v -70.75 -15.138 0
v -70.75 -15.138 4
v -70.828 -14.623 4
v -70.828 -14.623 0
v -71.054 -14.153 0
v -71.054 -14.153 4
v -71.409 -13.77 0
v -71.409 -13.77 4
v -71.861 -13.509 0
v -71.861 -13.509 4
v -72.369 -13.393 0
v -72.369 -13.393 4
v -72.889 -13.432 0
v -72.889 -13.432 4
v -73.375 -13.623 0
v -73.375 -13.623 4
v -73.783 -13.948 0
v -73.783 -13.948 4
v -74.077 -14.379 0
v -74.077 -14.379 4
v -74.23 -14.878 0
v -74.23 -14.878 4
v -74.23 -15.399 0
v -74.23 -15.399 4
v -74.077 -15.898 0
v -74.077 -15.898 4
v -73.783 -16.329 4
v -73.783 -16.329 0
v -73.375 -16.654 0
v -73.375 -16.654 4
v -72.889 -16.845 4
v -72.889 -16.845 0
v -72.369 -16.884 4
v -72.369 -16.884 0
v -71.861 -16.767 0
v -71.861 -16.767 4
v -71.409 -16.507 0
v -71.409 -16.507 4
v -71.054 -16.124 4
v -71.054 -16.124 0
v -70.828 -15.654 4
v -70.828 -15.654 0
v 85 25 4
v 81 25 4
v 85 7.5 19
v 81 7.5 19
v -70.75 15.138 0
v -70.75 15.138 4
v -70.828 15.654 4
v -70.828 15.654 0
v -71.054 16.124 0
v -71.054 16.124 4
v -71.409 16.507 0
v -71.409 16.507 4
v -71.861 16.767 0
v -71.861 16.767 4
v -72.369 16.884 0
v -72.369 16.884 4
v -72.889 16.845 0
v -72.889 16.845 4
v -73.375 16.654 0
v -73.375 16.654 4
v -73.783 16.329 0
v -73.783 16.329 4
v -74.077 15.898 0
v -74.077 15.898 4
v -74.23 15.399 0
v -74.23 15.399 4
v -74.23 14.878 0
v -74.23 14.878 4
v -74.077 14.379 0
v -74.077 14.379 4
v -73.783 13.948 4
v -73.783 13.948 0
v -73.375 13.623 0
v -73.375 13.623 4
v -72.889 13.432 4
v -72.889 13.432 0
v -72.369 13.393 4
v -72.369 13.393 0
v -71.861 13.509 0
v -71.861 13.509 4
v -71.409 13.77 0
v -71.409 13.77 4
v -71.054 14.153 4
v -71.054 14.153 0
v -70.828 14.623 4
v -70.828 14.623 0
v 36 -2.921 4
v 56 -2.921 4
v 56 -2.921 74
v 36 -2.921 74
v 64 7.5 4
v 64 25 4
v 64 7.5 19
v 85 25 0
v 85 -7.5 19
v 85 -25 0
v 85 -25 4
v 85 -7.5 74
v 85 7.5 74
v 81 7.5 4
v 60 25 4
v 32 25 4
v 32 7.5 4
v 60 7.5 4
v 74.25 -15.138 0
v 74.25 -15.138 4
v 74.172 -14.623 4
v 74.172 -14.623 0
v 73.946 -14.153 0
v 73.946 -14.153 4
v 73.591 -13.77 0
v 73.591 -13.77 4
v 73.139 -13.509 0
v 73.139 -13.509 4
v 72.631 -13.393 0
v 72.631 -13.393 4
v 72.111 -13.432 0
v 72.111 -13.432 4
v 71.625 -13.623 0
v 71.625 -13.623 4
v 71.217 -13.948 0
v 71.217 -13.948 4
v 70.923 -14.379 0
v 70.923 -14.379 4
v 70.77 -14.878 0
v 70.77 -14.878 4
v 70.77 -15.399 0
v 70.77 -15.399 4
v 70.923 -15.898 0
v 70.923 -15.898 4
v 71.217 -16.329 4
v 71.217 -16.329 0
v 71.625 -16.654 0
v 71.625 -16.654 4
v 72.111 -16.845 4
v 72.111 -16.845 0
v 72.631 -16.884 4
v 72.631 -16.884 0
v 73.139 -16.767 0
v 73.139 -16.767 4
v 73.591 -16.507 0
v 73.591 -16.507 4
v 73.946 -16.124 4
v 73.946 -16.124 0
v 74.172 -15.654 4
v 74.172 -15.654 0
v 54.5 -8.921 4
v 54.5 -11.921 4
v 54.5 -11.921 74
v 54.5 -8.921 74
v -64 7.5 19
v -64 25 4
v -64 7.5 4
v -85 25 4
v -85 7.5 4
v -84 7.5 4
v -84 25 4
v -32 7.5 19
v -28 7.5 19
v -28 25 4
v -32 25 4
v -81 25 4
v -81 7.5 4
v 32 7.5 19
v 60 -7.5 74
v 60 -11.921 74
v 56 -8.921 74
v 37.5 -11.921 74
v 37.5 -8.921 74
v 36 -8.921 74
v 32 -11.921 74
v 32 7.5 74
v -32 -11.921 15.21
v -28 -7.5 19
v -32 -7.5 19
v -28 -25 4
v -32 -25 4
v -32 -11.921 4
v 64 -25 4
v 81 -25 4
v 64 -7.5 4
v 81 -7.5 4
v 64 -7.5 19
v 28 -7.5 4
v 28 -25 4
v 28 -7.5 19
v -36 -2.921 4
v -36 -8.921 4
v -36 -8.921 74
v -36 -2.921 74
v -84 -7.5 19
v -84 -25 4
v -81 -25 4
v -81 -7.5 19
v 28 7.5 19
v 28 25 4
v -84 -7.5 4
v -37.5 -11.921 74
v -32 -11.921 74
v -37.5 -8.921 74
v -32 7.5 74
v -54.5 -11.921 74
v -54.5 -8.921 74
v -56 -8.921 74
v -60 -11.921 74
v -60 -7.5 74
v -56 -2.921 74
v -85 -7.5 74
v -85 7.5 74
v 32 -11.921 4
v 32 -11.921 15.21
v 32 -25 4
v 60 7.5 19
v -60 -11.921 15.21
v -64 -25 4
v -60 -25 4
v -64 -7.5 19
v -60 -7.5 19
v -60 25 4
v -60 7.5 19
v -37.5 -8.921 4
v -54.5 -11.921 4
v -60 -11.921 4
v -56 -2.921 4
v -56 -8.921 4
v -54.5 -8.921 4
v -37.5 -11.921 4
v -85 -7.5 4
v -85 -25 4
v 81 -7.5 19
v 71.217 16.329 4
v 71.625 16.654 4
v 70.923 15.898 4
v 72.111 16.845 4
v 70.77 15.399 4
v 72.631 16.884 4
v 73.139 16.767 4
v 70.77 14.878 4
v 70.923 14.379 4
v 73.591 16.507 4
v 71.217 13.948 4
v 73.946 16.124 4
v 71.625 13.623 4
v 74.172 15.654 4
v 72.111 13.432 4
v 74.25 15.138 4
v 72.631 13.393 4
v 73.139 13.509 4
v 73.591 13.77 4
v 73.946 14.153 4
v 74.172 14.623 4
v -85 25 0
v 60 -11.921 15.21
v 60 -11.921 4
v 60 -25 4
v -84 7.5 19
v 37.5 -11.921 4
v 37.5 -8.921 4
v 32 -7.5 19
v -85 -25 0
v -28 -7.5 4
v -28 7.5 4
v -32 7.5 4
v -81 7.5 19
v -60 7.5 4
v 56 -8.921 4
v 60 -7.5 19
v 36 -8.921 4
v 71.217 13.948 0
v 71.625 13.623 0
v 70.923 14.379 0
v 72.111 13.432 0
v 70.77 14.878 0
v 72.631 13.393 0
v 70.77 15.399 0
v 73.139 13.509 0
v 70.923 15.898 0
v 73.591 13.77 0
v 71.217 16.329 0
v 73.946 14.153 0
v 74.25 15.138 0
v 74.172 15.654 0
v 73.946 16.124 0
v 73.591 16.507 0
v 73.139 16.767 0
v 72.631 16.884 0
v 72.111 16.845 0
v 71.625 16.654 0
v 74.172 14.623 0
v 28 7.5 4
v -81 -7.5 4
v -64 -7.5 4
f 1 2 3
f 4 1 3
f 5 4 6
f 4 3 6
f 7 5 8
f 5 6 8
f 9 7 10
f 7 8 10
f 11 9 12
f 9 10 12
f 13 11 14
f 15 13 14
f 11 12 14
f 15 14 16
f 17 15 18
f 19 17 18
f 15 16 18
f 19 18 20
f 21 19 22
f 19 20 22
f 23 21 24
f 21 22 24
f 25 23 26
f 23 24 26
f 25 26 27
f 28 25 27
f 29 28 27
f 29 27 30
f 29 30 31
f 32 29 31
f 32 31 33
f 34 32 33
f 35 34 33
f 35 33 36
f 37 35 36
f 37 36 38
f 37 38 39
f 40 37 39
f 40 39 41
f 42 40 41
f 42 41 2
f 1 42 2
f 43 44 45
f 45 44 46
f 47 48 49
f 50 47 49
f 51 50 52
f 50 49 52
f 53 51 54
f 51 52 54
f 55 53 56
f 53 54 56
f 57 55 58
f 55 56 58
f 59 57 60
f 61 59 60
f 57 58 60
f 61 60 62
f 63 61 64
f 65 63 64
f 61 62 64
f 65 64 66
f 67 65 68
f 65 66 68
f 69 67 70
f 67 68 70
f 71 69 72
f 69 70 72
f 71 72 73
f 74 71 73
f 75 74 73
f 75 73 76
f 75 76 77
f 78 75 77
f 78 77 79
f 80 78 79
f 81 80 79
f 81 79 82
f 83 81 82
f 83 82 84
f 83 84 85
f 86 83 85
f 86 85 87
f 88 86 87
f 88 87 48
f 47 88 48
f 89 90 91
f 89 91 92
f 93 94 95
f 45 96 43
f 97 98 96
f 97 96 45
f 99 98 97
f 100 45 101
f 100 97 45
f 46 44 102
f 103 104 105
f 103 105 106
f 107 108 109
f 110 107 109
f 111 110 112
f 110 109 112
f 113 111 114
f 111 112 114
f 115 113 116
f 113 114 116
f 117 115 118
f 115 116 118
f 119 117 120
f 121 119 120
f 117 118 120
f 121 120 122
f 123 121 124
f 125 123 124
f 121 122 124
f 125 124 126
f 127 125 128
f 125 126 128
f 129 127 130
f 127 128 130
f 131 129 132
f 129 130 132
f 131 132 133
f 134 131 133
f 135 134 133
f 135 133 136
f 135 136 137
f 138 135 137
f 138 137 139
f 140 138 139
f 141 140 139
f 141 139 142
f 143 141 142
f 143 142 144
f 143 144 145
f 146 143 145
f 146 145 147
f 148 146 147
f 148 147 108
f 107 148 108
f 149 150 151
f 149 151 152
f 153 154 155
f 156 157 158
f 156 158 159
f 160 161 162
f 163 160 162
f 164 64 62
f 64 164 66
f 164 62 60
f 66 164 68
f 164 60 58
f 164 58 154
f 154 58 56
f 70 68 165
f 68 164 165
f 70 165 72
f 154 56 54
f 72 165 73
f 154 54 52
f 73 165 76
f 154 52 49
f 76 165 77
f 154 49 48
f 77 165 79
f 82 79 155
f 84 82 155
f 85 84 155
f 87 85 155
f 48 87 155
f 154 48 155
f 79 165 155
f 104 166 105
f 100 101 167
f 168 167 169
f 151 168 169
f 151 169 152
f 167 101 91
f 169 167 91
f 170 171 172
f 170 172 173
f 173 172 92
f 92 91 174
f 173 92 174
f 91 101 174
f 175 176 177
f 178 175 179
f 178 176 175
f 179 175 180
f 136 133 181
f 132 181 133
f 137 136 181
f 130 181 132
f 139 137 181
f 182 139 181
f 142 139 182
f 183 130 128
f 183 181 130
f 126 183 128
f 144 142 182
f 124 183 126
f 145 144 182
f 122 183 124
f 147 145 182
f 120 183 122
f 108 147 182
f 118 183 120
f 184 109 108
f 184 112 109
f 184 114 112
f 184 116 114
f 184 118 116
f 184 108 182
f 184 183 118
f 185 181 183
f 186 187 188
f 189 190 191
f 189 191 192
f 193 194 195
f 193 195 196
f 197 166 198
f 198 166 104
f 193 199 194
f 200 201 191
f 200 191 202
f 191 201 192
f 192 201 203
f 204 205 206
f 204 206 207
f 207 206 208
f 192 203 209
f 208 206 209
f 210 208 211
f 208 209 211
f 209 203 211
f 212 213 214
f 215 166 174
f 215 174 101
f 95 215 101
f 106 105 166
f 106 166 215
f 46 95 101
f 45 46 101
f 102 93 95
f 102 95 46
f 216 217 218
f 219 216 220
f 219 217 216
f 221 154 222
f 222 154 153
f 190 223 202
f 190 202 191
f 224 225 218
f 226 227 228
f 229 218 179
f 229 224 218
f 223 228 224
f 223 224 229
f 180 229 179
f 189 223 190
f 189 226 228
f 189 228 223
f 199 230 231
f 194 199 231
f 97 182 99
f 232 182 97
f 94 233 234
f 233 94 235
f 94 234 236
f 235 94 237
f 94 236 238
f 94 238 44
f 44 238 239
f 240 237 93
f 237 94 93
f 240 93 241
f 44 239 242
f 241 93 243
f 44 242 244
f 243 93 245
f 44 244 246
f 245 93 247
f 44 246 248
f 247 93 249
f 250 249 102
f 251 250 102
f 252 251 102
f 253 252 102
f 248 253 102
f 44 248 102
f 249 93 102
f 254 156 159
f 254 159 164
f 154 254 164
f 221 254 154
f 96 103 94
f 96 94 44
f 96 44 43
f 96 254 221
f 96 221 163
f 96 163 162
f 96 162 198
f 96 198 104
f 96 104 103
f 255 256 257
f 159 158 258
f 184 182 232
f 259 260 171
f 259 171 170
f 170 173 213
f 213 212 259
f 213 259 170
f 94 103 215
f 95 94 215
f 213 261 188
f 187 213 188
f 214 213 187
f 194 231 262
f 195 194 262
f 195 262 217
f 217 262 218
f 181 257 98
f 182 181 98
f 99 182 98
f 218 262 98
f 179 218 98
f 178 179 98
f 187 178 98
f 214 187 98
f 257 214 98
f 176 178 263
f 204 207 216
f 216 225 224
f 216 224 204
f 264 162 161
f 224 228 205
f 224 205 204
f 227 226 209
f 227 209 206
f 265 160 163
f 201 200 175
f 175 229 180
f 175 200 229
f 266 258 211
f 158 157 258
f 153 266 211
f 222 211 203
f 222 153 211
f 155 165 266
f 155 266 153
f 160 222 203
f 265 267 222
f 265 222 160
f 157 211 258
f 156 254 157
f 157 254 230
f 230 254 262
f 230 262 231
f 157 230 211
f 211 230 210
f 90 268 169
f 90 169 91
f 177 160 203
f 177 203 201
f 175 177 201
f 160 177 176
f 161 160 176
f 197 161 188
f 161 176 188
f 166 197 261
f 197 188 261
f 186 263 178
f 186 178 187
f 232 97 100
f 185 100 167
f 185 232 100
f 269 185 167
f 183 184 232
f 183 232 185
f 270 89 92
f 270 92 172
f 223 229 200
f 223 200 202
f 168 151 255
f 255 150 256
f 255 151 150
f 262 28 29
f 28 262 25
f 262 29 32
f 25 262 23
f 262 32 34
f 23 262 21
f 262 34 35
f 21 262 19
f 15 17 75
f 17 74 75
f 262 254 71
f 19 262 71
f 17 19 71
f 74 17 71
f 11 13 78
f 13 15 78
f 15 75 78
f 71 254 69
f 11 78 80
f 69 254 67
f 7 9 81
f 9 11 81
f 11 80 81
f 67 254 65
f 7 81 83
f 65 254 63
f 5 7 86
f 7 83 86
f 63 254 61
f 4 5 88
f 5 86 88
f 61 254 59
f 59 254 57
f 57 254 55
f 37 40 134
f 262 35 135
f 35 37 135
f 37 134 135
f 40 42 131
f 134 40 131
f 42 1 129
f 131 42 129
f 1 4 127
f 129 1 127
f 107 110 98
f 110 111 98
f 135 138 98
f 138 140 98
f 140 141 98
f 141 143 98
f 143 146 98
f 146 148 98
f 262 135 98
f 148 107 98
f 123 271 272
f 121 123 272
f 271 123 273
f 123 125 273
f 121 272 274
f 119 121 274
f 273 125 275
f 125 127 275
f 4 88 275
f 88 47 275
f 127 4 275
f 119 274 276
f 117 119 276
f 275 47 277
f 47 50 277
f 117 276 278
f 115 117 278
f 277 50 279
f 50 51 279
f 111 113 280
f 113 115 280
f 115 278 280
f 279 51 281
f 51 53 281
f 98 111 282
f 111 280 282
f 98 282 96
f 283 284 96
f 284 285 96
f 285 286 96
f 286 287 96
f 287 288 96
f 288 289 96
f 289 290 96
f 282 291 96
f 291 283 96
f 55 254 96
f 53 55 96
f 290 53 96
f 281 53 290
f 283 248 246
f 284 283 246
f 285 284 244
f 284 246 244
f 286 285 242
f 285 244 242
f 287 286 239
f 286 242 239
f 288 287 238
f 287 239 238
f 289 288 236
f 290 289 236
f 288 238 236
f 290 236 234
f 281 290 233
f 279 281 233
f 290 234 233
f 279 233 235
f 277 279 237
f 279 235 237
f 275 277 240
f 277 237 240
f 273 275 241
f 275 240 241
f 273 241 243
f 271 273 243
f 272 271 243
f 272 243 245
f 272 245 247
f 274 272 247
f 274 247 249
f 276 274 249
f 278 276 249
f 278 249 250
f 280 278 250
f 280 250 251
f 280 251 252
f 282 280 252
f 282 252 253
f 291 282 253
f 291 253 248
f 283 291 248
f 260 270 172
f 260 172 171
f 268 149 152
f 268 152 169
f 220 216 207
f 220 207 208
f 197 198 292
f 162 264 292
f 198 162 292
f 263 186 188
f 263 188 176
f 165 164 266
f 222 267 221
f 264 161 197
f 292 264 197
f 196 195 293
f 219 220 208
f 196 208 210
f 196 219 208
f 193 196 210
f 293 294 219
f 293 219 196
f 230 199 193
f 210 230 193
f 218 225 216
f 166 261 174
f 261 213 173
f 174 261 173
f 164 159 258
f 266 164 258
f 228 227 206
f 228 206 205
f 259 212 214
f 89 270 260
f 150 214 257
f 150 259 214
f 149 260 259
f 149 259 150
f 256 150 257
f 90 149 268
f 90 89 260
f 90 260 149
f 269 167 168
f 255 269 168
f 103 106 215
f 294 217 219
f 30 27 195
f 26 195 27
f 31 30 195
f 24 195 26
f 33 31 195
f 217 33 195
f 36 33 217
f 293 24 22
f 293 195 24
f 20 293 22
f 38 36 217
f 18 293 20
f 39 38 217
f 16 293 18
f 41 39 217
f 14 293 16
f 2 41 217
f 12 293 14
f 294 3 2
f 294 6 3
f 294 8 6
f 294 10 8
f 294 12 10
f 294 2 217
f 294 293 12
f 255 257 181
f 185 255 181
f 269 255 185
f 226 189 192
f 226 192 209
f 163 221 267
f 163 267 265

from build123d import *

# Parameters (mm, degrees)
CROQUIS1_W              = 170
CROQUIS1_H              = 50
SALIENTE_EXTRUIR1_DEPTH = 4
SALIENTE_EXTRUIR2_DEPTH = 70
SALIENTE_EXTRUIR3_DEPTH = 25
SALIENTE_EXTRUIR4_DEPTH = 64
SALIENTE_EXTRUIR5_DEPTH = 25
CROQUIS9_W              = 17
CROQUIS9_H              = 17.5
CROQUIS9_W_2            = 56
CORTAR_EXTRUIR1_DEPTH   = 70
CROQUIS11_W             = 64
CROQUIS11_H             = 55
CORTAR_EXTRUIR4_DEPTH   = 15
CROQUIS12_R             = 1.75
CORTAR_EXTRUIR5_DEPTH   = 15
CORTAR_EXTRUIR6_DEPTH   = 1


with BuildPart() as part:
    # Croquis1 → Saliente-Extruir1 (new body)
    with BuildSketch(Plane.XY):
        Rectangle(CROQUIS1_W, CROQUIS1_H)
    extrude(amount=SALIENTE_EXTRUIR1_DEPTH)

    # Croquis3 → Saliente-Extruir2 (add)
    with BuildSketch(Plane.XY.offset(4)):
        Polygon((-85, 7.5), (85, 7.5), (85, -7.5), (60, -7.5), (60, -11.921199344), (56, -11.921199344), (54.5, -11.921199344), (54.5, -8.921199344), (56, -8.921199344), (56, -2.921199344), (36, -2.921199344), (36, -8.921199344), (37.5, -8.921199344), (37.5, -11.921199344), (36, -11.921199344), (32, -11.921199344), (32, -7.5), (-32, -7.5), (-32, -11.921199344), (-36, -11.921199344), (-37.5, -11.921199344), (-37.5, -8.921199344), (-36, -8.921199344), (-36, -2.921199344), (-56, -2.921199344), (-56, -8.921199344), (-54.5, -8.921199344), (-54.5, -11.921199344), (-56, -11.921199344), (-60, -11.921199344), (-60, -7.5), (-85, -7.5), align=None)
    extrude(amount=SALIENTE_EXTRUIR2_DEPTH)

    # Croquis4 → Saliente-Extruir3 (add)
    with BuildSketch(Plane.ZY.offset(85)):
        Polygon((4, -25), (19, -7.5), (4, -7.5), align=None)
    saliente_extruir3 = extrude(amount=-SALIENTE_EXTRUIR3_DEPTH)

    # Croquis5 → Saliente-Extruir4 (add)
    with BuildSketch(Plane.ZY.offset(-32)):
        Polygon((19, -7.5), (4, -25), (4, -7.5), align=None)
    saliente_extruir4 = extrude(amount=SALIENTE_EXTRUIR4_DEPTH)

    # Croquis7 → Saliente-Extruir5 (add)
    with BuildSketch(Plane(origin=(60, 0, 0), x_dir=(0, 0, -1), z_dir=(1, 0, 0))):
        Polygon((-4, -25), (-19, -7.5), (-4, -7.5), align=None)
    saliente_extruir5 = extrude(amount=SALIENTE_EXTRUIR5_DEPTH)

    # Croquis9 → Cortar-Extruir1 (cut)
    with BuildSketch(Plane.XY.offset(74)):
        with Locations((-72.5, -16.25)):
            Rectangle(CROQUIS9_W, CROQUIS9_H)
        with Locations((0, -16.25)):
            Rectangle(CROQUIS9_W_2, CROQUIS9_H)
        with Locations((72.5, -16.25)):
            Rectangle(CROQUIS9_W, CROQUIS9_H)
    cortar_extruir1 = extrude(amount=-CORTAR_EXTRUIR1_DEPTH, mode=Mode.SUBTRACT)

    # Croquis11 → Cortar-Extruir4 (cut)
    with BuildSketch(Plane.XZ.offset(7.5)):
        with Locations((0, 46.5)):
            Rectangle(CROQUIS11_W, CROQUIS11_H)
    extrude(amount=-CORTAR_EXTRUIR4_DEPTH, mode=Mode.SUBTRACT)

    # Croquis12 → Cortar-Extruir5 (cut)
    with BuildSketch(Plane.XY.offset(4)):
        with Locations((-72.5, 15.138462845)):
            Circle(CROQUIS12_R)
        with Locations((-72.5, -15.138462845)):
            Circle(CROQUIS12_R)
        with Locations((72.5, -15.138462845)):
            Circle(CROQUIS12_R)
        with Locations((72.5, 15.138462845)):
            Circle(CROQUIS12_R)
    extrude(amount=-CORTAR_EXTRUIR5_DEPTH, mode=Mode.SUBTRACT)

    # Croquis14 → Cortar-Extruir6 (cut)
    with BuildSketch(Plane.ZY.offset(85)):
        Polygon((19, -7.5), (4, -7.5), (4, -25), align=None)
    cortar_extruir6 = extrude(amount=-CORTAR_EXTRUIR6_DEPTH, mode=Mode.SUBTRACT)

    # Simetría1: Saliente-Extruir3, Saliente-Extruir4, Saliente-Extruir5, Cortar-Extruir1, Cortar-Extruir6 across plane
    add(saliente_extruir3.mirror(Plane(origin=(0, 0, 0), x_dir=(0, 0, 1), z_dir=(0, -1, 0))))
    add(saliente_extruir4.mirror(Plane(origin=(0, 0, 0), x_dir=(0, 0, 1), z_dir=(0, -1, 0))))
    add(saliente_extruir5.mirror(Plane(origin=(0, 0, 0), x_dir=(0, 0, 1), z_dir=(0, -1, 0))))
    add(cortar_extruir1.mirror(Plane(origin=(0, 0, 0), x_dir=(0, 0, 1), z_dir=(0, -1, 0))), mode=Mode.SUBTRACT)
    add(cortar_extruir6.mirror(Plane(origin=(0, 0, 0), x_dir=(0, 0, 1), z_dir=(0, -1, 0))), mode=Mode.SUBTRACT)


solid = part.part
